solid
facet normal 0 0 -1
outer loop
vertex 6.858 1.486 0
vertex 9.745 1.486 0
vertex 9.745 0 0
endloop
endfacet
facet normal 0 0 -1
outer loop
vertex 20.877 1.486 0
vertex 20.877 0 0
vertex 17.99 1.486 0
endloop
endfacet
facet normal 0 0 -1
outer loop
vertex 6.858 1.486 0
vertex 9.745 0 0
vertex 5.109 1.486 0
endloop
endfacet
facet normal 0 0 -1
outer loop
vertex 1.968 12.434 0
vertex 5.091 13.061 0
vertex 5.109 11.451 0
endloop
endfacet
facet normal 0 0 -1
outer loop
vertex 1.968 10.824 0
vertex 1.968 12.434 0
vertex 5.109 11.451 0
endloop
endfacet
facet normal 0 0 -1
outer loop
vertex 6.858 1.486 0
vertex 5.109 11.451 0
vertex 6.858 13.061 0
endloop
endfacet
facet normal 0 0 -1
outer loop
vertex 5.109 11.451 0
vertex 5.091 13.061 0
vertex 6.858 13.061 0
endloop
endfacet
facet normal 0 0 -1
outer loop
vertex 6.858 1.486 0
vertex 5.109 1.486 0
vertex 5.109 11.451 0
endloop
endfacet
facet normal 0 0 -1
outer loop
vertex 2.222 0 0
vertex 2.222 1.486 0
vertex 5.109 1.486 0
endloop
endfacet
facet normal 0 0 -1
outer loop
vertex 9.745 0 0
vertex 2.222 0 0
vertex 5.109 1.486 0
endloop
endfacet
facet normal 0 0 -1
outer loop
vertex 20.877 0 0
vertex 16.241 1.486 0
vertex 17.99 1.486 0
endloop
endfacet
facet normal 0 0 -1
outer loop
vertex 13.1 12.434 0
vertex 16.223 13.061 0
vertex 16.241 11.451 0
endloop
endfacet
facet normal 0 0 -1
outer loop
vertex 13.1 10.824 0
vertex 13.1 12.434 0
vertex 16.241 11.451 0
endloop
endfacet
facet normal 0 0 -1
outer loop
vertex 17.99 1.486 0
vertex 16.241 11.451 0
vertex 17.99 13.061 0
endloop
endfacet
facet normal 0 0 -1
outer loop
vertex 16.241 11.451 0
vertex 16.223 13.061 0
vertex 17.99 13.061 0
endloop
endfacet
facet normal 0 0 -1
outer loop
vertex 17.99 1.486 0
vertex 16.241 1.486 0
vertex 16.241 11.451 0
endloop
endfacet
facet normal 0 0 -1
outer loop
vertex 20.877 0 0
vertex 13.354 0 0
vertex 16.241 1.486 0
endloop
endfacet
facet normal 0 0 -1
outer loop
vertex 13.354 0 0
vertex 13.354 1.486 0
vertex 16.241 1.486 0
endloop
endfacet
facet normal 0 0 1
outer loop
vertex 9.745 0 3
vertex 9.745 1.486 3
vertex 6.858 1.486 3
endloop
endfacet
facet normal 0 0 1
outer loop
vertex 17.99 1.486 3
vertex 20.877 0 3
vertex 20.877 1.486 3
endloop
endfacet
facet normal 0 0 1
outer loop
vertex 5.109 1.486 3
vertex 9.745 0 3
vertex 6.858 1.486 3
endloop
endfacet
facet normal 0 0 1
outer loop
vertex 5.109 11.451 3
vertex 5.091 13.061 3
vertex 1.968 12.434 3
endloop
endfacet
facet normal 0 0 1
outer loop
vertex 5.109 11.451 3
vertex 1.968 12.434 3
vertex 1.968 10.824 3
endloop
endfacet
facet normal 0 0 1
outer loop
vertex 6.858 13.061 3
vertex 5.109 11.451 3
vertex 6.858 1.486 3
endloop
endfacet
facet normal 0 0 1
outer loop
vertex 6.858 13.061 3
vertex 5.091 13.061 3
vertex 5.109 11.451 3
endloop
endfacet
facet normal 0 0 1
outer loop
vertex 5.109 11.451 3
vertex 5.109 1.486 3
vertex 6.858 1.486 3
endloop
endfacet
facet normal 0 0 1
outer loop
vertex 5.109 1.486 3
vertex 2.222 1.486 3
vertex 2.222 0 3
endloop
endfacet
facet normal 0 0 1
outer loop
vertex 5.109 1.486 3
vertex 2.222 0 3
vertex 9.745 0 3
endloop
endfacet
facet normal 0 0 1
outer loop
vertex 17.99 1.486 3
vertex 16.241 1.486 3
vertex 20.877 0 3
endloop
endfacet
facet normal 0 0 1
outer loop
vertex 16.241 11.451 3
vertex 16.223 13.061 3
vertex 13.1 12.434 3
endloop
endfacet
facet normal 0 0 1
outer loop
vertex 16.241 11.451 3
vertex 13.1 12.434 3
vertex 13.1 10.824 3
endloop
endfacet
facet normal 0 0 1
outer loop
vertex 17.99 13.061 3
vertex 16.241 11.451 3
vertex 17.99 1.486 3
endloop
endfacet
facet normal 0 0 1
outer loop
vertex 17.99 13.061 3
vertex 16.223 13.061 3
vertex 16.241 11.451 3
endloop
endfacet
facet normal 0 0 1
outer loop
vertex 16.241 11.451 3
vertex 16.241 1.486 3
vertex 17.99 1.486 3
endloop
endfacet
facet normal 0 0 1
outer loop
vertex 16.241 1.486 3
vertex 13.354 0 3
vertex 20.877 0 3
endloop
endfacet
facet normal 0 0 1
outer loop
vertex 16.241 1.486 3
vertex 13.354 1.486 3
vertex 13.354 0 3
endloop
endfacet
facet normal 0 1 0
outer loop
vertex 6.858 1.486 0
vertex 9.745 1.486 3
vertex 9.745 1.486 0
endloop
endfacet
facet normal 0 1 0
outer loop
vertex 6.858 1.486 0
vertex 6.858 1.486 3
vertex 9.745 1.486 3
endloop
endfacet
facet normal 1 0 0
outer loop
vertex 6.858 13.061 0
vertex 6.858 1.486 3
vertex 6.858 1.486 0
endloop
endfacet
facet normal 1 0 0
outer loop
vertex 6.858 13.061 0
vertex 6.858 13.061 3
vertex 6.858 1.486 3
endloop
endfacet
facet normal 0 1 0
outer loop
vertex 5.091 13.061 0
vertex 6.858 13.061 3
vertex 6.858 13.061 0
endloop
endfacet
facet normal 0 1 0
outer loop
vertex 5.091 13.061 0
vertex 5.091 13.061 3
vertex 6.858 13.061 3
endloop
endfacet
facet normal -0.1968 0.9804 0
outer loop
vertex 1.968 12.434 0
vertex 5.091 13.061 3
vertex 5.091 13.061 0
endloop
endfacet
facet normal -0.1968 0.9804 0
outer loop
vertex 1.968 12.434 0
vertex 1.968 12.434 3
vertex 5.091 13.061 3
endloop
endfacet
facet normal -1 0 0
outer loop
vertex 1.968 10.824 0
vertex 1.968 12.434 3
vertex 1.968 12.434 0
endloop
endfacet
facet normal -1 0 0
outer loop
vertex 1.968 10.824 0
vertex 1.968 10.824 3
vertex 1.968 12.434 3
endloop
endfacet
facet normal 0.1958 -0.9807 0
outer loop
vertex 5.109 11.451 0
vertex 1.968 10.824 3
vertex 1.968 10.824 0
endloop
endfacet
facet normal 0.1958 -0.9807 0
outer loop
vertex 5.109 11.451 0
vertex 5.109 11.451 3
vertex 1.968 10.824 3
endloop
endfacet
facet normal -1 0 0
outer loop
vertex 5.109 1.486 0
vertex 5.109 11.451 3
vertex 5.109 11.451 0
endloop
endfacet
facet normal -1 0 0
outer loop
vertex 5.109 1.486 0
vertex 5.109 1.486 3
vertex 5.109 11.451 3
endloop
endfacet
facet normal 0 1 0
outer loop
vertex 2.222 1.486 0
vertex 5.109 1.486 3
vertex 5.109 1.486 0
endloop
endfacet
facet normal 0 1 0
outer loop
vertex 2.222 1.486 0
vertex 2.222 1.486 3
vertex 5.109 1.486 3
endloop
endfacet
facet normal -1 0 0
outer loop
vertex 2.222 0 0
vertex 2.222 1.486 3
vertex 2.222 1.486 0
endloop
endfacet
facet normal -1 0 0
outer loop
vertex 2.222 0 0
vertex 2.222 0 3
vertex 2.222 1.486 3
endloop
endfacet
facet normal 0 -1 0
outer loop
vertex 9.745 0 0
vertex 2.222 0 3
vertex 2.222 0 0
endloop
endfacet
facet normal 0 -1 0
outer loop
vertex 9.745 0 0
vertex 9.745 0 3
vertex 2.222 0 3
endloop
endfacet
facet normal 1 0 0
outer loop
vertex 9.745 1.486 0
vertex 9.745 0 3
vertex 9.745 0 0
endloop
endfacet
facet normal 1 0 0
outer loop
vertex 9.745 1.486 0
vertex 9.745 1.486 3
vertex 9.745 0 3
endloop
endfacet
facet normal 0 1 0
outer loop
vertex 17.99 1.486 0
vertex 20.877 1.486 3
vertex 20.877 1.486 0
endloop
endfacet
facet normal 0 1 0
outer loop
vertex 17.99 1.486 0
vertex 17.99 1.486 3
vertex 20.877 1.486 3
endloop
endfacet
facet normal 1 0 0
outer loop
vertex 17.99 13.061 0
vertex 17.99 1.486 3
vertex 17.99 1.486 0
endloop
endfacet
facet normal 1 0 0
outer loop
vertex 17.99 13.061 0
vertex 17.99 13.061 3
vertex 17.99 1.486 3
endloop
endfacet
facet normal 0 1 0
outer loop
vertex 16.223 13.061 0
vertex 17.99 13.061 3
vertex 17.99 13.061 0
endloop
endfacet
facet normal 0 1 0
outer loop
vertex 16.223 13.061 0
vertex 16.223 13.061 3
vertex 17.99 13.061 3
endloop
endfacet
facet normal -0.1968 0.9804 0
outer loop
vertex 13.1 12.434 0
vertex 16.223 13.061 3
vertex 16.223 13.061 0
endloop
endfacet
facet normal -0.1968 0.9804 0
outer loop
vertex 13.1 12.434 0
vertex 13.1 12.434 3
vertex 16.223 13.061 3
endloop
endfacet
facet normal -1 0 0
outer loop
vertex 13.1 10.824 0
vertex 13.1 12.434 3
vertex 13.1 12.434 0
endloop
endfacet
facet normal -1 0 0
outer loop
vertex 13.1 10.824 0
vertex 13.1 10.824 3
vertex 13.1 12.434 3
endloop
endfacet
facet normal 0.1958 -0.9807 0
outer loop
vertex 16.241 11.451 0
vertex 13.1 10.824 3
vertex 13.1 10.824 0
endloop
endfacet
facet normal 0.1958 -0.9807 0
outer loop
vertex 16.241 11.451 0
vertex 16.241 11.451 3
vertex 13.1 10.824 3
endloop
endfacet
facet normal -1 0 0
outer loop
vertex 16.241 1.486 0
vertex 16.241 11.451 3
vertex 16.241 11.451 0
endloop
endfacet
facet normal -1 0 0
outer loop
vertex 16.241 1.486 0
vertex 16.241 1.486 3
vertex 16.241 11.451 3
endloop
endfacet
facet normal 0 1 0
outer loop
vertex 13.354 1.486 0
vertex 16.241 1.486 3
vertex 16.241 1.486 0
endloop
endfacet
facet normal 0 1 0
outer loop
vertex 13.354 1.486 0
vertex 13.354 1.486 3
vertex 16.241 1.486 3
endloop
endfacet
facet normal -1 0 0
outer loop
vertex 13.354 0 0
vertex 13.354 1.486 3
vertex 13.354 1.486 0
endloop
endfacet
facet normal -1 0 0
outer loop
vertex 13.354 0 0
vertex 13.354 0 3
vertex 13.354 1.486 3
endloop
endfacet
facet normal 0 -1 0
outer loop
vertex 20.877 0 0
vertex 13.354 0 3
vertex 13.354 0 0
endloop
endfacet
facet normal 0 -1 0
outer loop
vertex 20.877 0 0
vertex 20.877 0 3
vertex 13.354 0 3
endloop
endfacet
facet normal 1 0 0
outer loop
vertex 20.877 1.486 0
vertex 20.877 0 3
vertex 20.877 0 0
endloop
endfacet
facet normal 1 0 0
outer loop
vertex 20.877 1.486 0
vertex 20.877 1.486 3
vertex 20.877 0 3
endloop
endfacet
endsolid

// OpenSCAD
// Number Declaration
Which_number_do_you_need = 11; //[1:12]
// Font Declaration
What_font = "Standard"; //	[Standard, Fjalla One, Roboto, Ubuntu, Lobster, Anton, Exo Bold, Patua One]


// Declare what size to use for each number
numSize =       (What_font == "Standard") ? 12.9 : 
                (What_font == "Fjalla One") ? 13.4 :
                (What_font == "Roboto") ? 12.9 :
                (What_font == "Ubuntu") ? 12.9 :
                (What_font == "Lobster") ? 13.9 :
                (What_font == "Anton") ? 13.9 :
                (What_font == "Exo Bold" ? 13.9 : 13.9);

//    text(Which_number_do_you_need, size = numSize, font = What_font);
    
    echo(Which_number_do_you_need);
    echo(What_font);
    echo(numSize);
    
if(Which_number_do_you_need==1) linear_extrude(height = 3){text("1", size = numSize, font = What_font);}
if(Which_number_do_you_need==2) linear_extrude(height = 3){text("2", size = numSize, font = What_font);}
if(Which_number_do_you_need==3) linear_extrude(height = 3){text("3", size = numSize, font = What_font);}
if(Which_number_do_you_need==4) linear_extrude(height = 3){text("4", size = numSize, font = What_font);}
if(Which_number_do_you_need==5) linear_extrude(height = 3){text("5", size = numSize, font = What_font);}
if(Which_number_do_you_need==6) linear_extrude(height = 3){text("6", size = numSize, font = What_font);}
if(Which_number_do_you_need==7) linear_extrude(height = 3){text("7", size = numSize, font = What_font);}
if(Which_number_do_you_need==8) linear_extrude(height = 3){text("8", size = numSize, font = What_font);}
if(Which_number_do_you_need==9) linear_extrude(height = 3){text("9", size = numSize, font = What_font);}
if(Which_number_do_you_need==10) linear_extrude(height = 3){text("10", size = numSize, font = What_font);}
if(Which_number_do_you_need==11) linear_extrude(height = 3){text("11", size = numSize, font = What_font);}
if(Which_number_do_you_need==12) linear_extrude(height = 3){text("12", size = numSize, font = What_font);}
